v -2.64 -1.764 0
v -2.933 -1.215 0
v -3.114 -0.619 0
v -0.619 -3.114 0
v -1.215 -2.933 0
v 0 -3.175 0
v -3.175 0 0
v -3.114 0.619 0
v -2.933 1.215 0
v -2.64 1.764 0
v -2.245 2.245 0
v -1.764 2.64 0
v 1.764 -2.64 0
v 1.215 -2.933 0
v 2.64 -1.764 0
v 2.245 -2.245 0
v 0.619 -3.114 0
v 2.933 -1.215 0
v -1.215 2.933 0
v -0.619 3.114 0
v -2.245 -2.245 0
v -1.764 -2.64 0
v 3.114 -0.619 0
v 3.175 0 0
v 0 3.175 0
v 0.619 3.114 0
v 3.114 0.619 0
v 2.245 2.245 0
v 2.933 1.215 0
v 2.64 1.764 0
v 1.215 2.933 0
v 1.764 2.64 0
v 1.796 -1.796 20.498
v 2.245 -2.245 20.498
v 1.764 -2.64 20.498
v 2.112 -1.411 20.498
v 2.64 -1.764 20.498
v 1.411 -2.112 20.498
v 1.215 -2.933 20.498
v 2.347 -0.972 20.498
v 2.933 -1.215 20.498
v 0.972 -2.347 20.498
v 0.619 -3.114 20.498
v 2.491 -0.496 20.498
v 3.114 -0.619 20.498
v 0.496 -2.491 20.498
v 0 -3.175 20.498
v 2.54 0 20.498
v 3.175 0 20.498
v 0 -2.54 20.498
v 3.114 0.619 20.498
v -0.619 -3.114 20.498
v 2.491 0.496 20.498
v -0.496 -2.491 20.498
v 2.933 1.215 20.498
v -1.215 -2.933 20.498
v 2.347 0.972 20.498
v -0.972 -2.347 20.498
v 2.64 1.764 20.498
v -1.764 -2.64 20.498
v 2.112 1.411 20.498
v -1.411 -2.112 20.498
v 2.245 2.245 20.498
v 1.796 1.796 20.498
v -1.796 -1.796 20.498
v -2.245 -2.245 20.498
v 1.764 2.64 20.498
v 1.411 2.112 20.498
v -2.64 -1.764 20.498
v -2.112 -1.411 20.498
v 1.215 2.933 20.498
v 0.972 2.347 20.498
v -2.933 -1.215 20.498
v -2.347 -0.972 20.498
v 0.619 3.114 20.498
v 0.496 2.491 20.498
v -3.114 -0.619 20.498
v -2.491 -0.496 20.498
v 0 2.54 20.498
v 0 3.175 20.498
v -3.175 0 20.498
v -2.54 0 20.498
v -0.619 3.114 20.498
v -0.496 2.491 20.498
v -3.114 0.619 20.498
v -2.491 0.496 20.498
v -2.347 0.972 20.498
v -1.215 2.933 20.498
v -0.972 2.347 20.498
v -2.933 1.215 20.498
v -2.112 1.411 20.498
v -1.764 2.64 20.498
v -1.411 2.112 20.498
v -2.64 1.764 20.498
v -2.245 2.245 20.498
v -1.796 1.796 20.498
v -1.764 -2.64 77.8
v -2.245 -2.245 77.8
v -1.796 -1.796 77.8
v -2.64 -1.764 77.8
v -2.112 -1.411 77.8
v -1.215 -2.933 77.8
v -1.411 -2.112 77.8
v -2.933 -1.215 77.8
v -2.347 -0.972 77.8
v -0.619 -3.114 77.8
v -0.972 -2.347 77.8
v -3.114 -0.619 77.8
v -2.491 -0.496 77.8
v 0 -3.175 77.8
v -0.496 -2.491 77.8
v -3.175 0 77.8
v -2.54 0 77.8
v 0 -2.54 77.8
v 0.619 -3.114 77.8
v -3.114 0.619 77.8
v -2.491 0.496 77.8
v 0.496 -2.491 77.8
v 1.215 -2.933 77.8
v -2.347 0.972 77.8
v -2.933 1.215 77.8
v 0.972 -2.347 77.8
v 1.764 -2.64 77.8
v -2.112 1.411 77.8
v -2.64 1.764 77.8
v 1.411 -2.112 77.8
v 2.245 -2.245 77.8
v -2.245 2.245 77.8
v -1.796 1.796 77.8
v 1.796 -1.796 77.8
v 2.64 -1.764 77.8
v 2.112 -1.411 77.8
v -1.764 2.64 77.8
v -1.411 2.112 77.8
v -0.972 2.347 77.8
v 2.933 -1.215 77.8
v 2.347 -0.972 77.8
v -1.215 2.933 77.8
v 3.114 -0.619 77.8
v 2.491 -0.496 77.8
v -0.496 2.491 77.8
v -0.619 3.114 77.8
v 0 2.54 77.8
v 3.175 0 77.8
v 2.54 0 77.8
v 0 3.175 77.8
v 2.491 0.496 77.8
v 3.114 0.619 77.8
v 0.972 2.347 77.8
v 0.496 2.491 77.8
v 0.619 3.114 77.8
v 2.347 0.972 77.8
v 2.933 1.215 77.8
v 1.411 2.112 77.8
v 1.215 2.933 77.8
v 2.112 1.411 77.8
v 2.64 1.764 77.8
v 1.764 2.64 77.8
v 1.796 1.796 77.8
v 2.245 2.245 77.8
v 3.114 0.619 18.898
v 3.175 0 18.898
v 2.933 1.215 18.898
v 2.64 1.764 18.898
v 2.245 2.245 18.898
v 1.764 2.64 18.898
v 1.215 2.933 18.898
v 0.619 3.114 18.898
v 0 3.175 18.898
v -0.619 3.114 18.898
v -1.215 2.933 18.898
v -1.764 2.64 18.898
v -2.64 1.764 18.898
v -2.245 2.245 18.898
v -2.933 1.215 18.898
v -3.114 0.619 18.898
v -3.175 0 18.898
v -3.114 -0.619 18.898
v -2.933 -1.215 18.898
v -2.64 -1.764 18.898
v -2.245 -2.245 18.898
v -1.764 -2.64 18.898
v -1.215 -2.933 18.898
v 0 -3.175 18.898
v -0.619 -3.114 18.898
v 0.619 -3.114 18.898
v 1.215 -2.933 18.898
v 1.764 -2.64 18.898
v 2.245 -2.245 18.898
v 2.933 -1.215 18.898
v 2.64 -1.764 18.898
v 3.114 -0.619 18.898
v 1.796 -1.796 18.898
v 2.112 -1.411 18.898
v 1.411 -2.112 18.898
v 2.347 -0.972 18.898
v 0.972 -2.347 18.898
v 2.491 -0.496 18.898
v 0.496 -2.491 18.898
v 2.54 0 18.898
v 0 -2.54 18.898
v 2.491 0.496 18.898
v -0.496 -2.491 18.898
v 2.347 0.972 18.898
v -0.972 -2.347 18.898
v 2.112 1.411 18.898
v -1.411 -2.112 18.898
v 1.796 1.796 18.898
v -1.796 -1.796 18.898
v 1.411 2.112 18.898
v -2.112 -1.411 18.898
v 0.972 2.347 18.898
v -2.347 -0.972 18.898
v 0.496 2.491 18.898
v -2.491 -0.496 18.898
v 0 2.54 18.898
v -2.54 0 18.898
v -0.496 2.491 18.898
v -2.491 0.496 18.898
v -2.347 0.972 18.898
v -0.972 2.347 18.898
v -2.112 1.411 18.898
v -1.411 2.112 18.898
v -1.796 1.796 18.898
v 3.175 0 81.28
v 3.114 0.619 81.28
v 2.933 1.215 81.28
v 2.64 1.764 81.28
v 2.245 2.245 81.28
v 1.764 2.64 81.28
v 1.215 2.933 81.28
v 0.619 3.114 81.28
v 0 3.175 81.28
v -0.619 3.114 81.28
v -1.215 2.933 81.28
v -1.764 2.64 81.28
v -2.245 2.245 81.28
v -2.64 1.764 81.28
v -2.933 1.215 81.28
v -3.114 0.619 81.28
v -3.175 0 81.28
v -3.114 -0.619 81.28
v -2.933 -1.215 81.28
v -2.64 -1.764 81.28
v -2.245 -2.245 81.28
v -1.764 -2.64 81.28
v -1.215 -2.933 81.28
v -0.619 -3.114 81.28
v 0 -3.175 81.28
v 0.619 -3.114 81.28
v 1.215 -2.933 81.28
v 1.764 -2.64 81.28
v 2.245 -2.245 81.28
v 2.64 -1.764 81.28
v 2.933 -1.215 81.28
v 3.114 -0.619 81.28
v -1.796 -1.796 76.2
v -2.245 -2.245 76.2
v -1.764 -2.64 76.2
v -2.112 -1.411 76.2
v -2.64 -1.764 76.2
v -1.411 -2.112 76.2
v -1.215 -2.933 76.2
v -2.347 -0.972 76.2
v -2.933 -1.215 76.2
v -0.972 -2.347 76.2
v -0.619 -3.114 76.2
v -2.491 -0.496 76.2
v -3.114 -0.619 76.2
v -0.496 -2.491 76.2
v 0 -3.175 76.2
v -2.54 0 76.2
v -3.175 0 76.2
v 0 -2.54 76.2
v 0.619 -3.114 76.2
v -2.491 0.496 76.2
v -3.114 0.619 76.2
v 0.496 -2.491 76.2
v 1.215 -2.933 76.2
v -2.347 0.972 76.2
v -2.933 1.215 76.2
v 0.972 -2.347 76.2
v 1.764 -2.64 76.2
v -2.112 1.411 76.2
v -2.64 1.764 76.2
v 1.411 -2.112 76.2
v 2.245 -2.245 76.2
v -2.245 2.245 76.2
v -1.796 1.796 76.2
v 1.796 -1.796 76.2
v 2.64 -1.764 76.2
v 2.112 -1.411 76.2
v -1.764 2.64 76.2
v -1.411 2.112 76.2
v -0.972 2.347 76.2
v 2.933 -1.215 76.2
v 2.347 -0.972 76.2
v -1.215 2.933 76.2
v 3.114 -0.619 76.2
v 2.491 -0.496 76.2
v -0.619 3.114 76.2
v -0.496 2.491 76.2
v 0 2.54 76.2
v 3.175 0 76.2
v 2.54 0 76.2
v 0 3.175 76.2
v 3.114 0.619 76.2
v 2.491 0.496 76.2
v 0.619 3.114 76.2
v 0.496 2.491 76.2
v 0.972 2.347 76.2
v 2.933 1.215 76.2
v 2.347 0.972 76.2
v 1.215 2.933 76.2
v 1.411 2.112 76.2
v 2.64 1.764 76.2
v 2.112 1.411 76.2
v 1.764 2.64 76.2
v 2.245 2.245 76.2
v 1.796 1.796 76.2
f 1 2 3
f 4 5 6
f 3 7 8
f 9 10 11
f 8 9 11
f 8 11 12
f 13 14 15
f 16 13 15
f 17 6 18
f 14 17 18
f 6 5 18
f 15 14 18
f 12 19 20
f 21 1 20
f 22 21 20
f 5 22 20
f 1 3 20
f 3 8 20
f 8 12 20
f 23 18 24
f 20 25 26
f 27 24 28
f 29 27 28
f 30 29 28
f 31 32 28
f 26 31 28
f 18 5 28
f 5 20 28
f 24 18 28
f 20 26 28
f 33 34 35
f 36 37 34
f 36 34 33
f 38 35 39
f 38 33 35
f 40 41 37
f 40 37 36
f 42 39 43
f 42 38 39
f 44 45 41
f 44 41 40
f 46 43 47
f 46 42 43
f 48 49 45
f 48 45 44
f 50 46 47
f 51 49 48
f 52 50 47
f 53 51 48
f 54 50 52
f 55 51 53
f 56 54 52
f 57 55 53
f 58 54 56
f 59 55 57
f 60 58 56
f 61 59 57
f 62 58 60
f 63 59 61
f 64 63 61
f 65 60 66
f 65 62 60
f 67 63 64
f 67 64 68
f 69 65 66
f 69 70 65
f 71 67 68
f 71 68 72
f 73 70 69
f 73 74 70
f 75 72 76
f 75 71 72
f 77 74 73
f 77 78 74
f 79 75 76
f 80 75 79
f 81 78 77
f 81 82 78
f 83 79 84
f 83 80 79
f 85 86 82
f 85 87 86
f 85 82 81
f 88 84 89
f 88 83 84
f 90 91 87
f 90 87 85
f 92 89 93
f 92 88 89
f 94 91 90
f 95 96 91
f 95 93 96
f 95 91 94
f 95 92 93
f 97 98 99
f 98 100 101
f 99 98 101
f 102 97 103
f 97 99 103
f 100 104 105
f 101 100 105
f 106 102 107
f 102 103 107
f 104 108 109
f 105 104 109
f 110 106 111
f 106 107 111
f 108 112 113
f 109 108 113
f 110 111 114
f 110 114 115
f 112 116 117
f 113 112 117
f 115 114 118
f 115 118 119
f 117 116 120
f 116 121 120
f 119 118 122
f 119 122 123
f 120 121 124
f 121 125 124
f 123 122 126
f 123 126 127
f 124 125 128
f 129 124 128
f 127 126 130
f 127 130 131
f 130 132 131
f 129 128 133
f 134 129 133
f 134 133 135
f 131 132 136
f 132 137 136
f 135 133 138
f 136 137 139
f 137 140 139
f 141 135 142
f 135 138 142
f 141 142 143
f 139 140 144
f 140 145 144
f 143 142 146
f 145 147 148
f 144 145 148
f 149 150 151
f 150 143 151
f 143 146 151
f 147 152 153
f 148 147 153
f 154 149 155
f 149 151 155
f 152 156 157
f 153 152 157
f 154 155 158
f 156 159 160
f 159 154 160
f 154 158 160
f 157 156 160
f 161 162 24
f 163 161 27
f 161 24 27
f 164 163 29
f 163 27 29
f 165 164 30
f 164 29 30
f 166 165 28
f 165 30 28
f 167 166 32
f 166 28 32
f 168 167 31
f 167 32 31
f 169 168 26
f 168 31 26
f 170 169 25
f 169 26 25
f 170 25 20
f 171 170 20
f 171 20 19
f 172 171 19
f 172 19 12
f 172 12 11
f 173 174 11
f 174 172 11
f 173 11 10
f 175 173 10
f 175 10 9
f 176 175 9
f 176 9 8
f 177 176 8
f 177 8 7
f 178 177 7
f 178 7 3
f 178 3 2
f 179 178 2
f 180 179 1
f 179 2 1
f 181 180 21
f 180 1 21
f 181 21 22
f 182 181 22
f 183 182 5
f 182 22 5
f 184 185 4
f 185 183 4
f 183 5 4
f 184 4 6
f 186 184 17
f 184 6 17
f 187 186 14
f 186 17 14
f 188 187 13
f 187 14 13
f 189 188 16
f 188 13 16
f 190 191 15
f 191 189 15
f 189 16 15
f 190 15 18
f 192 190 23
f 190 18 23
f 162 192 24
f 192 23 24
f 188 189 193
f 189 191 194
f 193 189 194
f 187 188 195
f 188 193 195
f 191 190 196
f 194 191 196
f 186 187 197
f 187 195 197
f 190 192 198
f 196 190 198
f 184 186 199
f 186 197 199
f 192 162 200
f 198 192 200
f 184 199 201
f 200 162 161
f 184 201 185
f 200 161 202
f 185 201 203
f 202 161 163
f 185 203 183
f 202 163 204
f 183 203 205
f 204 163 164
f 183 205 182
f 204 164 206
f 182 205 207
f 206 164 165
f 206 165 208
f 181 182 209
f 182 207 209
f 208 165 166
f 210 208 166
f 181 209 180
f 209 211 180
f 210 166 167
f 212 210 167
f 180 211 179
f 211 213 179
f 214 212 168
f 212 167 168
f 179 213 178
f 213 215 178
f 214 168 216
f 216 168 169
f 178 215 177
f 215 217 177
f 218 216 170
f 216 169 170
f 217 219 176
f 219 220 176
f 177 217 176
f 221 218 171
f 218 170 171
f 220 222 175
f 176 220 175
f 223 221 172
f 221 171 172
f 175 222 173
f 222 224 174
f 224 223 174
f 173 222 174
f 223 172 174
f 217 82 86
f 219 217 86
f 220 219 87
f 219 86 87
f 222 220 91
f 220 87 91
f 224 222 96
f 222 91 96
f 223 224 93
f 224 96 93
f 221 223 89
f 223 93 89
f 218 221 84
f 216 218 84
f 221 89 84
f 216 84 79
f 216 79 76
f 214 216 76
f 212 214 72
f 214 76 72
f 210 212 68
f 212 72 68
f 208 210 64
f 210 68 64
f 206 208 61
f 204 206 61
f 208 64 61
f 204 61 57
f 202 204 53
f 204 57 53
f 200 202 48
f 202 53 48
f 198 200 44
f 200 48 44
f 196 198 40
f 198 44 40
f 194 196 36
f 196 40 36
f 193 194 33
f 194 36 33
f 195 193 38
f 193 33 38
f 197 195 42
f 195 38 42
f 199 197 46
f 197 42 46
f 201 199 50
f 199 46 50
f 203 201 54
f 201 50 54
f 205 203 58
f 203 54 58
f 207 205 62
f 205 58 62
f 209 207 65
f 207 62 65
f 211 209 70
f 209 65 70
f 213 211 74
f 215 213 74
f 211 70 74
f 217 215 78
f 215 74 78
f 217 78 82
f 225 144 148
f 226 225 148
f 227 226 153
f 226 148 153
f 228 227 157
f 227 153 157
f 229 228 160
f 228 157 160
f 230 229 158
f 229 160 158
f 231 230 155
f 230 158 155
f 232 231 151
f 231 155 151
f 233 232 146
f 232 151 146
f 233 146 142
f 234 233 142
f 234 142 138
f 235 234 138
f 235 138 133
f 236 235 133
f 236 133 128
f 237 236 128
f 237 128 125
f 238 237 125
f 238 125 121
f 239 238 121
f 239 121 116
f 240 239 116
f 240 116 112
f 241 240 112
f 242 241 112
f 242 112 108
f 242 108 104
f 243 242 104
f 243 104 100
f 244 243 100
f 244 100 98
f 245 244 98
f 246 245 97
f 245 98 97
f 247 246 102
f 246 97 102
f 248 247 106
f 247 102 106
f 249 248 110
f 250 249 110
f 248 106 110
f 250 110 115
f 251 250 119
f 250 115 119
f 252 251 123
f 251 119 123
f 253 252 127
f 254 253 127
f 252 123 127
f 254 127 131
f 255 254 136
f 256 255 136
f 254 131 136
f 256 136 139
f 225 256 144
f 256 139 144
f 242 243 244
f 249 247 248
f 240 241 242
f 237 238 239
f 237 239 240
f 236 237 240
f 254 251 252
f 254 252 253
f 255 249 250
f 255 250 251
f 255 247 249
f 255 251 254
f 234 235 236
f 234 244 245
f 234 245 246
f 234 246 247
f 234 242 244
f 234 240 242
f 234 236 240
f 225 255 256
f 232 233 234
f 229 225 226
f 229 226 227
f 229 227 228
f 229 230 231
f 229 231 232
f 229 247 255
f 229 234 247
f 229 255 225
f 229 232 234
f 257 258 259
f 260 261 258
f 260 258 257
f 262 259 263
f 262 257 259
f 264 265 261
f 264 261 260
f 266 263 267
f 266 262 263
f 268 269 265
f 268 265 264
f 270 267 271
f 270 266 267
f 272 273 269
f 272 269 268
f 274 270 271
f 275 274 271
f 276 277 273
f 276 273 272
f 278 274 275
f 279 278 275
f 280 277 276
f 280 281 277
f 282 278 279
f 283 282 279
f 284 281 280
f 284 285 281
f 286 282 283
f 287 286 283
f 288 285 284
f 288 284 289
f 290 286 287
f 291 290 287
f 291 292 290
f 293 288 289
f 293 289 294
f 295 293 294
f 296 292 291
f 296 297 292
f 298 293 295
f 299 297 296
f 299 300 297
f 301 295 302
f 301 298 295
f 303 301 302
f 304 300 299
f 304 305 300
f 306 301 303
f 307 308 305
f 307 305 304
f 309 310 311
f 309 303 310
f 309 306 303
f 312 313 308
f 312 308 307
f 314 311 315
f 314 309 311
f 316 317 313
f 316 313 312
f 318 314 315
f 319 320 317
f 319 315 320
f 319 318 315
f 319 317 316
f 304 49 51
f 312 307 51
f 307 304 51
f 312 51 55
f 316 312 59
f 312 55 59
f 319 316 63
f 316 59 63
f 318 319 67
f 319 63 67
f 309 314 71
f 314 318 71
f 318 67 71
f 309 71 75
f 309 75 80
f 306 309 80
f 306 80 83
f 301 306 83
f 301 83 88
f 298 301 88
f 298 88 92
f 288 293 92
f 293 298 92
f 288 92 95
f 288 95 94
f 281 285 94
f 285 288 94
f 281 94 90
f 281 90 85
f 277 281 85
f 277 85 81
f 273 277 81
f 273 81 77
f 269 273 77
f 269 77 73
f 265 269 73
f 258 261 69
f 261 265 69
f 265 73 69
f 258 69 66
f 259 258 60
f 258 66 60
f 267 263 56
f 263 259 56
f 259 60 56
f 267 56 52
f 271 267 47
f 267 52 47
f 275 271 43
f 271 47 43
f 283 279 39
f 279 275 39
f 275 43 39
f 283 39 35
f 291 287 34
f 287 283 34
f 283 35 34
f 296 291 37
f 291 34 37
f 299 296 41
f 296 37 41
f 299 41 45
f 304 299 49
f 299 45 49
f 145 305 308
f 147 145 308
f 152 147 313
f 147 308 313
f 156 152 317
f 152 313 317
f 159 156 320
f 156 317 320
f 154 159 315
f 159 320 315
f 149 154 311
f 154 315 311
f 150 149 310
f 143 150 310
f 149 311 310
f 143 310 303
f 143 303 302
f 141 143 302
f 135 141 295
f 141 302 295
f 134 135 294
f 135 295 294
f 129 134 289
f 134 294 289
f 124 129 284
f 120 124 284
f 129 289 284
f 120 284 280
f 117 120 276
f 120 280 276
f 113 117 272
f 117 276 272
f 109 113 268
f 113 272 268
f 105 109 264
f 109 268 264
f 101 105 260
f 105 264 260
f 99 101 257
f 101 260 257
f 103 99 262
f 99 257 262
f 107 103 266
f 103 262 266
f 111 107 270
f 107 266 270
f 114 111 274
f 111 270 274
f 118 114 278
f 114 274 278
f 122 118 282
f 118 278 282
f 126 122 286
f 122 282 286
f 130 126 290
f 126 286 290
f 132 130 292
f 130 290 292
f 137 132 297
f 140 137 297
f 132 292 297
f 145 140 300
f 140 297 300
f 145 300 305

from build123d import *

# Parameters (mm, degrees)
SKETCH2_R           = 3.175
BOSS_EXTRUDE1_DEPTH = 81.28
SKETCH3_OUTSIDE_W   = 24.704
SKETCH3_OUTSIDE_H   = 24.704
SKETCH3_OUTSIDE_R   = 2.54
CUT_EXTRUDE1_DEPTH  = 1.6002
SKETCH4_OUTSIDE_W   = 24.704
SKETCH4_OUTSIDE_H   = 24.704
SKETCH4_OUTSIDE_R   = 2.54
CUT_EXTRUDE2_DEPTH  = 1.6002


with BuildPart() as part:
    # Sketch2 → Boss-Extrude1 (new body)
    with BuildSketch(Plane.XY):
        Circle(SKETCH2_R)
    extrude(amount=BOSS_EXTRUDE1_DEPTH)

    # Sketch3 outside → Cut-Extrude1 (cut)
    with BuildSketch(Plane(origin=(0, 0, 20.4978), x_dir=(-1, 0, 0), z_dir=(0, 0, -1))):
        Rectangle(SKETCH3_OUTSIDE_W, SKETCH3_OUTSIDE_H)
        Circle(SKETCH3_OUTSIDE_R, mode=Mode.SUBTRACT)
    extrude(amount=CUT_EXTRUDE1_DEPTH, mode=Mode.SUBTRACT)

    # Sketch4 outside → Cut-Extrude2 (cut)
    with BuildSketch(Plane.XY.offset(76.2)):
        Rectangle(SKETCH4_OUTSIDE_W, SKETCH4_OUTSIDE_H)
        Circle(SKETCH4_OUTSIDE_R, mode=Mode.SUBTRACT)
    extrude(amount=CUT_EXTRUDE2_DEPTH, mode=Mode.SUBTRACT)


solid = part.part
